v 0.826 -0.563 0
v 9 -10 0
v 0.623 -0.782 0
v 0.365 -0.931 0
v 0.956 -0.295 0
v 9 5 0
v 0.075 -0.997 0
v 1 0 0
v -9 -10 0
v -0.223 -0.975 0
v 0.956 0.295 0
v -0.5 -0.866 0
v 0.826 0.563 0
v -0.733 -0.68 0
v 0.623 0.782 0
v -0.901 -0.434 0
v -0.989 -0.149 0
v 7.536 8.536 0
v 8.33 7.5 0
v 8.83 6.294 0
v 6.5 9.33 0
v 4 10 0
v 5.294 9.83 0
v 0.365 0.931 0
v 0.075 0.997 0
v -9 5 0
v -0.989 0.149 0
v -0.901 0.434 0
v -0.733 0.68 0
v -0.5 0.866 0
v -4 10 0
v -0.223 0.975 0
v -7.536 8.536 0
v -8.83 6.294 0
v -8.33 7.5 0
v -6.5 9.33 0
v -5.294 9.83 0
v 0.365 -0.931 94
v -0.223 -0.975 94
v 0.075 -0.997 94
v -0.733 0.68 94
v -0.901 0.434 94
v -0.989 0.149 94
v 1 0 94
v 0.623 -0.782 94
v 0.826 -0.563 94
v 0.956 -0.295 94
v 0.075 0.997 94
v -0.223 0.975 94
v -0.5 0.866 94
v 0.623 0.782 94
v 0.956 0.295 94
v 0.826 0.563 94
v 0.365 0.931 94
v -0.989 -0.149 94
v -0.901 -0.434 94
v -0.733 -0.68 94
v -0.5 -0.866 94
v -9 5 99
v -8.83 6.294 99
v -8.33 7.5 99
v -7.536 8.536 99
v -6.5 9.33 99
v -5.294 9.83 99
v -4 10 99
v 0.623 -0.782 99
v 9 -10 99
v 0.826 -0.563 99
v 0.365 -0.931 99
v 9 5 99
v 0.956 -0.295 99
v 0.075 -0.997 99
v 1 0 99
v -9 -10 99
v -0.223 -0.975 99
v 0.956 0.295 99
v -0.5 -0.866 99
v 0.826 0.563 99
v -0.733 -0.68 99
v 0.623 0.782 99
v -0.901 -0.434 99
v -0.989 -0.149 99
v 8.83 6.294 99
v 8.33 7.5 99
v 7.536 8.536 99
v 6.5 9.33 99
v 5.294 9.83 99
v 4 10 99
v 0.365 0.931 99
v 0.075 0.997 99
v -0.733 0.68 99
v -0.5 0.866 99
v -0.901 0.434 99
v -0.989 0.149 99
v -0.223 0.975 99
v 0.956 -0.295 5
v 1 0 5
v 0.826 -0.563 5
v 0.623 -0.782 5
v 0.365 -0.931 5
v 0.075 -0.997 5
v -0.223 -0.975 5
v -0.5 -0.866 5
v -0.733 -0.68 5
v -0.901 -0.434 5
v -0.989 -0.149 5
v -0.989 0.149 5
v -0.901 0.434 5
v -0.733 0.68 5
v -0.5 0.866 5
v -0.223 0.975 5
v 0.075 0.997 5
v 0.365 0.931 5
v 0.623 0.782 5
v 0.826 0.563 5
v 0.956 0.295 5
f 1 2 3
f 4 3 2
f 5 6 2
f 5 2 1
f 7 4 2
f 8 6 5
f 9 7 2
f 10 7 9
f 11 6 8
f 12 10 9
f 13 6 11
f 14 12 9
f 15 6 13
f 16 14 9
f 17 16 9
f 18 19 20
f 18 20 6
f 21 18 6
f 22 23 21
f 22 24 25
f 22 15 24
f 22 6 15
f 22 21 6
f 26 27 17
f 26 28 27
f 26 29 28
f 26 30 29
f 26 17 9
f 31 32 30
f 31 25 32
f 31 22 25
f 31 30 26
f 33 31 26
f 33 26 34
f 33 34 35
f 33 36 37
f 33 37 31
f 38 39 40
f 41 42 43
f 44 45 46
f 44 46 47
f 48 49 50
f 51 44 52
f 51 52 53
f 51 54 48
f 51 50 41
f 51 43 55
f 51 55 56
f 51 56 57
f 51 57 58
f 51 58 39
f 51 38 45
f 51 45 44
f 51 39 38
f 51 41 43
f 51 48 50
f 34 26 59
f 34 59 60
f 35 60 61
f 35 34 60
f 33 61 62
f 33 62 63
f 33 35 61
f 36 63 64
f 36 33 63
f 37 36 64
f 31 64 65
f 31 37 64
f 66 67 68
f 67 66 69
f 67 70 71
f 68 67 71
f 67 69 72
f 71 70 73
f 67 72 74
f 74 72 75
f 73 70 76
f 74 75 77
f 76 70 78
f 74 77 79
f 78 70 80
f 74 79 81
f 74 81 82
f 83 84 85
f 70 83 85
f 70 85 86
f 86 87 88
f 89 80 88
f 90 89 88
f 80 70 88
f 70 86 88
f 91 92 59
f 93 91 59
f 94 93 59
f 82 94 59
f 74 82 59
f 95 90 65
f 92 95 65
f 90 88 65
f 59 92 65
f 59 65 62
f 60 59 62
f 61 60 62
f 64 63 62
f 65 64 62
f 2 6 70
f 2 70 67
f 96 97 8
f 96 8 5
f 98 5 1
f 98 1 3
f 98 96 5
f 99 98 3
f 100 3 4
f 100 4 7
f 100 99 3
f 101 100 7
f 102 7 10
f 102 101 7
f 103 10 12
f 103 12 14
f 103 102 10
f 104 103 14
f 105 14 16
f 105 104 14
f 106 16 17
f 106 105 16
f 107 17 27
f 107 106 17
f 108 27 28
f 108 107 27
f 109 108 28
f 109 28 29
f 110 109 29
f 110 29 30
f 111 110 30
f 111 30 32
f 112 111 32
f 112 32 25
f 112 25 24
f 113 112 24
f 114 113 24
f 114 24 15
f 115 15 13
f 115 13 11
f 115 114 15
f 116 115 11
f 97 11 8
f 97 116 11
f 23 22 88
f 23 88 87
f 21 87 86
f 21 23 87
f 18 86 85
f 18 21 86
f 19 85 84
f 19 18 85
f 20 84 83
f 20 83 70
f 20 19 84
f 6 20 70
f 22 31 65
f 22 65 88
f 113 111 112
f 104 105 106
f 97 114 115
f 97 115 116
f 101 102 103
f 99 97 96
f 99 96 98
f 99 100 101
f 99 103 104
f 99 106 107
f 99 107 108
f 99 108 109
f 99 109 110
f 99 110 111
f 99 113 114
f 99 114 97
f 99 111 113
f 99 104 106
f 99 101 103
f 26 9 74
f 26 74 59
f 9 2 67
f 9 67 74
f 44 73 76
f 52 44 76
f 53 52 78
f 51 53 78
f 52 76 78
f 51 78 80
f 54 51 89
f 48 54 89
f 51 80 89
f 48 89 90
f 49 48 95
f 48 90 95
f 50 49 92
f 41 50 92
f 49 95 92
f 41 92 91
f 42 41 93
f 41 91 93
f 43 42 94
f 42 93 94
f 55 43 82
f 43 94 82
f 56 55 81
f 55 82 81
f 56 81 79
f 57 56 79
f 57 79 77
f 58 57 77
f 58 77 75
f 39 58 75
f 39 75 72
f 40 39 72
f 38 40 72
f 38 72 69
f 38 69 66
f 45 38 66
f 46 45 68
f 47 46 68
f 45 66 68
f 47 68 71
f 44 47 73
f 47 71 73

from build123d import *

# Parameters (mm, degrees)
EXTRUDE_1_DEPTH     = 99
SKETCH_2_R          = 1
CUT_EXTRUDE_1_DEPTH = 5
CUT_EXTRUDE_START   = -5
SKETCH_3_R          = 1
CUT_EXTRUDE_2_DEPTH = 5


with BuildPart() as part:
    # 草图1 → 凸台-拉伸1 (new body)
    with BuildSketch(Plane.XY):
        with BuildLine():
            Line((-4, 10), (4, 10))
            ThreePointArc((4, 10), (7.535533906, 8.535533906), (9, 5))
            Line((9, 5), (9, -10))
            Line((9, -10), (-9, -10))
            Line((-9, -10), (-9, 5))
            ThreePointArc((-9, 5), (-7.535533906, 8.535533906), (-4, 10))
        make_face()
    extrude(amount=EXTRUDE_1_DEPTH)

    # 草图2 → 切除-拉伸1 (cut)
    with BuildSketch(Plane.XY.offset(99)):
        Circle(SKETCH_2_R)
    extrude(amount=-CUT_EXTRUDE_1_DEPTH, mode=Mode.SUBTRACT)

    # 草图3 → 切除-拉伸2 (cut)
    with BuildSketch(Plane(origin=(0, 0, 0), x_dir=(-1, 0, 0), z_dir=(0, 0, -1)).offset(CUT_EXTRUDE_START)):
        with Locations(Location((0, 0, 0), (0, 0, 180))):
            Circle(SKETCH_3_R)
    extrude(amount=CUT_EXTRUDE_2_DEPTH, mode=Mode.SUBTRACT)


solid = part.part
